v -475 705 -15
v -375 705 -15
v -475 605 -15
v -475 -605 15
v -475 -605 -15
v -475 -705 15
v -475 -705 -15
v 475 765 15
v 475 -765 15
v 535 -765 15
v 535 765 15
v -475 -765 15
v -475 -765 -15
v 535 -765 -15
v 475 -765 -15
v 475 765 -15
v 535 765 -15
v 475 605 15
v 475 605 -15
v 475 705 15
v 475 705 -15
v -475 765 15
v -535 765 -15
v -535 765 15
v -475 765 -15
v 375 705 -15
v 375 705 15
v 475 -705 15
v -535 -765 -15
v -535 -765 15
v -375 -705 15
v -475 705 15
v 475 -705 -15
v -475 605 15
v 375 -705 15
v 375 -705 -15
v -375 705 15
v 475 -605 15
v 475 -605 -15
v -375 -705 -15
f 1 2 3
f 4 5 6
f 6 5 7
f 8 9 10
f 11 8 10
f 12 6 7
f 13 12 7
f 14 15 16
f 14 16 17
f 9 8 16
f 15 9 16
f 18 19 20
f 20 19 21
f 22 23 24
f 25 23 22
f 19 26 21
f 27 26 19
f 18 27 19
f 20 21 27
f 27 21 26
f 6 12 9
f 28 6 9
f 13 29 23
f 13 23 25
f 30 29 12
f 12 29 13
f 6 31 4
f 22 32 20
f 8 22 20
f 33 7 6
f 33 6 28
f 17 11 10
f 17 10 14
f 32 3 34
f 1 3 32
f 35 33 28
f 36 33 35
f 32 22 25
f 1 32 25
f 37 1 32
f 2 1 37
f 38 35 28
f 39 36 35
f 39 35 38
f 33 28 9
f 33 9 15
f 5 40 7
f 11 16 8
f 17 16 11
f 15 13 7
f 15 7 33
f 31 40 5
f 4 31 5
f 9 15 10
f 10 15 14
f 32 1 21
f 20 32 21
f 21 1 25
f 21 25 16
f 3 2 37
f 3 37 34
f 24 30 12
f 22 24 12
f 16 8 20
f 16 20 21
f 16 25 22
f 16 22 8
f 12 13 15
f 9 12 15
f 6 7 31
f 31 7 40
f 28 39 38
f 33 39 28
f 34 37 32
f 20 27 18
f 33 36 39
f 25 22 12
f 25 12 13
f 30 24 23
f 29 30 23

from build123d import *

# Parameters (mm, degrees)
MEMBER_START                 = -765
MEMBER_20_X_20_1_OUTLINE_W   = 60
MEMBER_20_X_20_1_OUTLINE_H   = 30
MEMBER_20_X_20_1_DEPTH       = 1530
MEMBER_20_X_20_1_2_OUTLINE_W = 950
MEMBER_20_X_20_1_2_OUTLINE_H = 30
MEMBER_20_X_20_1_2_DEPTH     = 60
MEMBER_START_2               = 705
MEMBER_20_X_20_1_3_OUTLINE_W = 950
MEMBER_20_X_20_1_3_OUTLINE_H = 30
MEMBER_20_X_20_1_3_DEPTH     = 60
GUSSET_1_THICKNESS           = 30


# Read off the part's stored shape, not the designer's step: Квадрат 20 X 20(1)
with BuildPart() as part:
    # Member 20 X 20_1 outline → Member 20 X 20_1 (new body)
    with BuildSketch(Plane(origin=(0, 0, 0), x_dir=(1, 0, 0), z_dir=(0, 1, 0)).offset(MEMBER_START)):
        with Locations((505, 0)):
            Rectangle(MEMBER_20_X_20_1_OUTLINE_W, MEMBER_20_X_20_1_OUTLINE_H)
        with Locations((-505, 0)):
            Rectangle(MEMBER_20_X_20_1_OUTLINE_W, MEMBER_20_X_20_1_OUTLINE_H)
    extrude(amount=MEMBER_20_X_20_1_DEPTH)


with BuildPart() as body_2:
    # Member 20 X 20_1 2 outline → Member 20 X 20_1 2 (new body)
    with BuildSketch(Plane(origin=(0, 0, 0), x_dir=(1, 0, 0), z_dir=(0, 1, 0)).offset(MEMBER_START)):
        Rectangle(MEMBER_20_X_20_1_2_OUTLINE_W, MEMBER_20_X_20_1_2_OUTLINE_H)
    extrude(amount=MEMBER_20_X_20_1_2_DEPTH)


with BuildPart() as body_3:
    # Member 20 X 20_1 3 outline → Member 20 X 20_1 3 (new body)
    with BuildSketch(Plane(origin=(0, 0, 0), x_dir=(1, 0, 0), z_dir=(0, 1, 0)).offset(MEMBER_START_2)):
        Rectangle(MEMBER_20_X_20_1_3_OUTLINE_W, MEMBER_20_X_20_1_3_OUTLINE_H)
    extrude(amount=MEMBER_20_X_20_1_3_DEPTH)


with BuildPart() as body_4:
    # Gusset 1: a gusset: a plate 30.0 thick in the corner of two members, its outline drawn in place
    gusset_1_outline = Wire([Line((-475, 705, -15), (-375, 705, -15)), Line((-375, 705, -15), (-475, 605, -15)), Line((-475, 605, -15), (-475, 705, -15))])
    add(extrude(Face(gusset_1_outline), amount=GUSSET_1_THICKNESS, dir=(0, 0, 1)))


with BuildPart() as body_5:
    # Зеркальное отражение2: mirrored copy
    add(body_4.part.mirror(Plane(origin=(0, 0, 0), x_dir=(0, 0, 1), z_dir=(1, 0, 0))))


with BuildPart() as body_6:
    # Зеркальное отражение3: mirrored copy
    add(body_4.part.mirror(Plane.ZX))


with BuildPart() as body_7:
    # Mirror 3 2: mirrored copy
    add(body_5.part.mirror(Plane.ZX))


solid = Compound([part.part, body_2.part, body_3.part, body_4.part, body_5.part, body_6.part, body_7.part])
